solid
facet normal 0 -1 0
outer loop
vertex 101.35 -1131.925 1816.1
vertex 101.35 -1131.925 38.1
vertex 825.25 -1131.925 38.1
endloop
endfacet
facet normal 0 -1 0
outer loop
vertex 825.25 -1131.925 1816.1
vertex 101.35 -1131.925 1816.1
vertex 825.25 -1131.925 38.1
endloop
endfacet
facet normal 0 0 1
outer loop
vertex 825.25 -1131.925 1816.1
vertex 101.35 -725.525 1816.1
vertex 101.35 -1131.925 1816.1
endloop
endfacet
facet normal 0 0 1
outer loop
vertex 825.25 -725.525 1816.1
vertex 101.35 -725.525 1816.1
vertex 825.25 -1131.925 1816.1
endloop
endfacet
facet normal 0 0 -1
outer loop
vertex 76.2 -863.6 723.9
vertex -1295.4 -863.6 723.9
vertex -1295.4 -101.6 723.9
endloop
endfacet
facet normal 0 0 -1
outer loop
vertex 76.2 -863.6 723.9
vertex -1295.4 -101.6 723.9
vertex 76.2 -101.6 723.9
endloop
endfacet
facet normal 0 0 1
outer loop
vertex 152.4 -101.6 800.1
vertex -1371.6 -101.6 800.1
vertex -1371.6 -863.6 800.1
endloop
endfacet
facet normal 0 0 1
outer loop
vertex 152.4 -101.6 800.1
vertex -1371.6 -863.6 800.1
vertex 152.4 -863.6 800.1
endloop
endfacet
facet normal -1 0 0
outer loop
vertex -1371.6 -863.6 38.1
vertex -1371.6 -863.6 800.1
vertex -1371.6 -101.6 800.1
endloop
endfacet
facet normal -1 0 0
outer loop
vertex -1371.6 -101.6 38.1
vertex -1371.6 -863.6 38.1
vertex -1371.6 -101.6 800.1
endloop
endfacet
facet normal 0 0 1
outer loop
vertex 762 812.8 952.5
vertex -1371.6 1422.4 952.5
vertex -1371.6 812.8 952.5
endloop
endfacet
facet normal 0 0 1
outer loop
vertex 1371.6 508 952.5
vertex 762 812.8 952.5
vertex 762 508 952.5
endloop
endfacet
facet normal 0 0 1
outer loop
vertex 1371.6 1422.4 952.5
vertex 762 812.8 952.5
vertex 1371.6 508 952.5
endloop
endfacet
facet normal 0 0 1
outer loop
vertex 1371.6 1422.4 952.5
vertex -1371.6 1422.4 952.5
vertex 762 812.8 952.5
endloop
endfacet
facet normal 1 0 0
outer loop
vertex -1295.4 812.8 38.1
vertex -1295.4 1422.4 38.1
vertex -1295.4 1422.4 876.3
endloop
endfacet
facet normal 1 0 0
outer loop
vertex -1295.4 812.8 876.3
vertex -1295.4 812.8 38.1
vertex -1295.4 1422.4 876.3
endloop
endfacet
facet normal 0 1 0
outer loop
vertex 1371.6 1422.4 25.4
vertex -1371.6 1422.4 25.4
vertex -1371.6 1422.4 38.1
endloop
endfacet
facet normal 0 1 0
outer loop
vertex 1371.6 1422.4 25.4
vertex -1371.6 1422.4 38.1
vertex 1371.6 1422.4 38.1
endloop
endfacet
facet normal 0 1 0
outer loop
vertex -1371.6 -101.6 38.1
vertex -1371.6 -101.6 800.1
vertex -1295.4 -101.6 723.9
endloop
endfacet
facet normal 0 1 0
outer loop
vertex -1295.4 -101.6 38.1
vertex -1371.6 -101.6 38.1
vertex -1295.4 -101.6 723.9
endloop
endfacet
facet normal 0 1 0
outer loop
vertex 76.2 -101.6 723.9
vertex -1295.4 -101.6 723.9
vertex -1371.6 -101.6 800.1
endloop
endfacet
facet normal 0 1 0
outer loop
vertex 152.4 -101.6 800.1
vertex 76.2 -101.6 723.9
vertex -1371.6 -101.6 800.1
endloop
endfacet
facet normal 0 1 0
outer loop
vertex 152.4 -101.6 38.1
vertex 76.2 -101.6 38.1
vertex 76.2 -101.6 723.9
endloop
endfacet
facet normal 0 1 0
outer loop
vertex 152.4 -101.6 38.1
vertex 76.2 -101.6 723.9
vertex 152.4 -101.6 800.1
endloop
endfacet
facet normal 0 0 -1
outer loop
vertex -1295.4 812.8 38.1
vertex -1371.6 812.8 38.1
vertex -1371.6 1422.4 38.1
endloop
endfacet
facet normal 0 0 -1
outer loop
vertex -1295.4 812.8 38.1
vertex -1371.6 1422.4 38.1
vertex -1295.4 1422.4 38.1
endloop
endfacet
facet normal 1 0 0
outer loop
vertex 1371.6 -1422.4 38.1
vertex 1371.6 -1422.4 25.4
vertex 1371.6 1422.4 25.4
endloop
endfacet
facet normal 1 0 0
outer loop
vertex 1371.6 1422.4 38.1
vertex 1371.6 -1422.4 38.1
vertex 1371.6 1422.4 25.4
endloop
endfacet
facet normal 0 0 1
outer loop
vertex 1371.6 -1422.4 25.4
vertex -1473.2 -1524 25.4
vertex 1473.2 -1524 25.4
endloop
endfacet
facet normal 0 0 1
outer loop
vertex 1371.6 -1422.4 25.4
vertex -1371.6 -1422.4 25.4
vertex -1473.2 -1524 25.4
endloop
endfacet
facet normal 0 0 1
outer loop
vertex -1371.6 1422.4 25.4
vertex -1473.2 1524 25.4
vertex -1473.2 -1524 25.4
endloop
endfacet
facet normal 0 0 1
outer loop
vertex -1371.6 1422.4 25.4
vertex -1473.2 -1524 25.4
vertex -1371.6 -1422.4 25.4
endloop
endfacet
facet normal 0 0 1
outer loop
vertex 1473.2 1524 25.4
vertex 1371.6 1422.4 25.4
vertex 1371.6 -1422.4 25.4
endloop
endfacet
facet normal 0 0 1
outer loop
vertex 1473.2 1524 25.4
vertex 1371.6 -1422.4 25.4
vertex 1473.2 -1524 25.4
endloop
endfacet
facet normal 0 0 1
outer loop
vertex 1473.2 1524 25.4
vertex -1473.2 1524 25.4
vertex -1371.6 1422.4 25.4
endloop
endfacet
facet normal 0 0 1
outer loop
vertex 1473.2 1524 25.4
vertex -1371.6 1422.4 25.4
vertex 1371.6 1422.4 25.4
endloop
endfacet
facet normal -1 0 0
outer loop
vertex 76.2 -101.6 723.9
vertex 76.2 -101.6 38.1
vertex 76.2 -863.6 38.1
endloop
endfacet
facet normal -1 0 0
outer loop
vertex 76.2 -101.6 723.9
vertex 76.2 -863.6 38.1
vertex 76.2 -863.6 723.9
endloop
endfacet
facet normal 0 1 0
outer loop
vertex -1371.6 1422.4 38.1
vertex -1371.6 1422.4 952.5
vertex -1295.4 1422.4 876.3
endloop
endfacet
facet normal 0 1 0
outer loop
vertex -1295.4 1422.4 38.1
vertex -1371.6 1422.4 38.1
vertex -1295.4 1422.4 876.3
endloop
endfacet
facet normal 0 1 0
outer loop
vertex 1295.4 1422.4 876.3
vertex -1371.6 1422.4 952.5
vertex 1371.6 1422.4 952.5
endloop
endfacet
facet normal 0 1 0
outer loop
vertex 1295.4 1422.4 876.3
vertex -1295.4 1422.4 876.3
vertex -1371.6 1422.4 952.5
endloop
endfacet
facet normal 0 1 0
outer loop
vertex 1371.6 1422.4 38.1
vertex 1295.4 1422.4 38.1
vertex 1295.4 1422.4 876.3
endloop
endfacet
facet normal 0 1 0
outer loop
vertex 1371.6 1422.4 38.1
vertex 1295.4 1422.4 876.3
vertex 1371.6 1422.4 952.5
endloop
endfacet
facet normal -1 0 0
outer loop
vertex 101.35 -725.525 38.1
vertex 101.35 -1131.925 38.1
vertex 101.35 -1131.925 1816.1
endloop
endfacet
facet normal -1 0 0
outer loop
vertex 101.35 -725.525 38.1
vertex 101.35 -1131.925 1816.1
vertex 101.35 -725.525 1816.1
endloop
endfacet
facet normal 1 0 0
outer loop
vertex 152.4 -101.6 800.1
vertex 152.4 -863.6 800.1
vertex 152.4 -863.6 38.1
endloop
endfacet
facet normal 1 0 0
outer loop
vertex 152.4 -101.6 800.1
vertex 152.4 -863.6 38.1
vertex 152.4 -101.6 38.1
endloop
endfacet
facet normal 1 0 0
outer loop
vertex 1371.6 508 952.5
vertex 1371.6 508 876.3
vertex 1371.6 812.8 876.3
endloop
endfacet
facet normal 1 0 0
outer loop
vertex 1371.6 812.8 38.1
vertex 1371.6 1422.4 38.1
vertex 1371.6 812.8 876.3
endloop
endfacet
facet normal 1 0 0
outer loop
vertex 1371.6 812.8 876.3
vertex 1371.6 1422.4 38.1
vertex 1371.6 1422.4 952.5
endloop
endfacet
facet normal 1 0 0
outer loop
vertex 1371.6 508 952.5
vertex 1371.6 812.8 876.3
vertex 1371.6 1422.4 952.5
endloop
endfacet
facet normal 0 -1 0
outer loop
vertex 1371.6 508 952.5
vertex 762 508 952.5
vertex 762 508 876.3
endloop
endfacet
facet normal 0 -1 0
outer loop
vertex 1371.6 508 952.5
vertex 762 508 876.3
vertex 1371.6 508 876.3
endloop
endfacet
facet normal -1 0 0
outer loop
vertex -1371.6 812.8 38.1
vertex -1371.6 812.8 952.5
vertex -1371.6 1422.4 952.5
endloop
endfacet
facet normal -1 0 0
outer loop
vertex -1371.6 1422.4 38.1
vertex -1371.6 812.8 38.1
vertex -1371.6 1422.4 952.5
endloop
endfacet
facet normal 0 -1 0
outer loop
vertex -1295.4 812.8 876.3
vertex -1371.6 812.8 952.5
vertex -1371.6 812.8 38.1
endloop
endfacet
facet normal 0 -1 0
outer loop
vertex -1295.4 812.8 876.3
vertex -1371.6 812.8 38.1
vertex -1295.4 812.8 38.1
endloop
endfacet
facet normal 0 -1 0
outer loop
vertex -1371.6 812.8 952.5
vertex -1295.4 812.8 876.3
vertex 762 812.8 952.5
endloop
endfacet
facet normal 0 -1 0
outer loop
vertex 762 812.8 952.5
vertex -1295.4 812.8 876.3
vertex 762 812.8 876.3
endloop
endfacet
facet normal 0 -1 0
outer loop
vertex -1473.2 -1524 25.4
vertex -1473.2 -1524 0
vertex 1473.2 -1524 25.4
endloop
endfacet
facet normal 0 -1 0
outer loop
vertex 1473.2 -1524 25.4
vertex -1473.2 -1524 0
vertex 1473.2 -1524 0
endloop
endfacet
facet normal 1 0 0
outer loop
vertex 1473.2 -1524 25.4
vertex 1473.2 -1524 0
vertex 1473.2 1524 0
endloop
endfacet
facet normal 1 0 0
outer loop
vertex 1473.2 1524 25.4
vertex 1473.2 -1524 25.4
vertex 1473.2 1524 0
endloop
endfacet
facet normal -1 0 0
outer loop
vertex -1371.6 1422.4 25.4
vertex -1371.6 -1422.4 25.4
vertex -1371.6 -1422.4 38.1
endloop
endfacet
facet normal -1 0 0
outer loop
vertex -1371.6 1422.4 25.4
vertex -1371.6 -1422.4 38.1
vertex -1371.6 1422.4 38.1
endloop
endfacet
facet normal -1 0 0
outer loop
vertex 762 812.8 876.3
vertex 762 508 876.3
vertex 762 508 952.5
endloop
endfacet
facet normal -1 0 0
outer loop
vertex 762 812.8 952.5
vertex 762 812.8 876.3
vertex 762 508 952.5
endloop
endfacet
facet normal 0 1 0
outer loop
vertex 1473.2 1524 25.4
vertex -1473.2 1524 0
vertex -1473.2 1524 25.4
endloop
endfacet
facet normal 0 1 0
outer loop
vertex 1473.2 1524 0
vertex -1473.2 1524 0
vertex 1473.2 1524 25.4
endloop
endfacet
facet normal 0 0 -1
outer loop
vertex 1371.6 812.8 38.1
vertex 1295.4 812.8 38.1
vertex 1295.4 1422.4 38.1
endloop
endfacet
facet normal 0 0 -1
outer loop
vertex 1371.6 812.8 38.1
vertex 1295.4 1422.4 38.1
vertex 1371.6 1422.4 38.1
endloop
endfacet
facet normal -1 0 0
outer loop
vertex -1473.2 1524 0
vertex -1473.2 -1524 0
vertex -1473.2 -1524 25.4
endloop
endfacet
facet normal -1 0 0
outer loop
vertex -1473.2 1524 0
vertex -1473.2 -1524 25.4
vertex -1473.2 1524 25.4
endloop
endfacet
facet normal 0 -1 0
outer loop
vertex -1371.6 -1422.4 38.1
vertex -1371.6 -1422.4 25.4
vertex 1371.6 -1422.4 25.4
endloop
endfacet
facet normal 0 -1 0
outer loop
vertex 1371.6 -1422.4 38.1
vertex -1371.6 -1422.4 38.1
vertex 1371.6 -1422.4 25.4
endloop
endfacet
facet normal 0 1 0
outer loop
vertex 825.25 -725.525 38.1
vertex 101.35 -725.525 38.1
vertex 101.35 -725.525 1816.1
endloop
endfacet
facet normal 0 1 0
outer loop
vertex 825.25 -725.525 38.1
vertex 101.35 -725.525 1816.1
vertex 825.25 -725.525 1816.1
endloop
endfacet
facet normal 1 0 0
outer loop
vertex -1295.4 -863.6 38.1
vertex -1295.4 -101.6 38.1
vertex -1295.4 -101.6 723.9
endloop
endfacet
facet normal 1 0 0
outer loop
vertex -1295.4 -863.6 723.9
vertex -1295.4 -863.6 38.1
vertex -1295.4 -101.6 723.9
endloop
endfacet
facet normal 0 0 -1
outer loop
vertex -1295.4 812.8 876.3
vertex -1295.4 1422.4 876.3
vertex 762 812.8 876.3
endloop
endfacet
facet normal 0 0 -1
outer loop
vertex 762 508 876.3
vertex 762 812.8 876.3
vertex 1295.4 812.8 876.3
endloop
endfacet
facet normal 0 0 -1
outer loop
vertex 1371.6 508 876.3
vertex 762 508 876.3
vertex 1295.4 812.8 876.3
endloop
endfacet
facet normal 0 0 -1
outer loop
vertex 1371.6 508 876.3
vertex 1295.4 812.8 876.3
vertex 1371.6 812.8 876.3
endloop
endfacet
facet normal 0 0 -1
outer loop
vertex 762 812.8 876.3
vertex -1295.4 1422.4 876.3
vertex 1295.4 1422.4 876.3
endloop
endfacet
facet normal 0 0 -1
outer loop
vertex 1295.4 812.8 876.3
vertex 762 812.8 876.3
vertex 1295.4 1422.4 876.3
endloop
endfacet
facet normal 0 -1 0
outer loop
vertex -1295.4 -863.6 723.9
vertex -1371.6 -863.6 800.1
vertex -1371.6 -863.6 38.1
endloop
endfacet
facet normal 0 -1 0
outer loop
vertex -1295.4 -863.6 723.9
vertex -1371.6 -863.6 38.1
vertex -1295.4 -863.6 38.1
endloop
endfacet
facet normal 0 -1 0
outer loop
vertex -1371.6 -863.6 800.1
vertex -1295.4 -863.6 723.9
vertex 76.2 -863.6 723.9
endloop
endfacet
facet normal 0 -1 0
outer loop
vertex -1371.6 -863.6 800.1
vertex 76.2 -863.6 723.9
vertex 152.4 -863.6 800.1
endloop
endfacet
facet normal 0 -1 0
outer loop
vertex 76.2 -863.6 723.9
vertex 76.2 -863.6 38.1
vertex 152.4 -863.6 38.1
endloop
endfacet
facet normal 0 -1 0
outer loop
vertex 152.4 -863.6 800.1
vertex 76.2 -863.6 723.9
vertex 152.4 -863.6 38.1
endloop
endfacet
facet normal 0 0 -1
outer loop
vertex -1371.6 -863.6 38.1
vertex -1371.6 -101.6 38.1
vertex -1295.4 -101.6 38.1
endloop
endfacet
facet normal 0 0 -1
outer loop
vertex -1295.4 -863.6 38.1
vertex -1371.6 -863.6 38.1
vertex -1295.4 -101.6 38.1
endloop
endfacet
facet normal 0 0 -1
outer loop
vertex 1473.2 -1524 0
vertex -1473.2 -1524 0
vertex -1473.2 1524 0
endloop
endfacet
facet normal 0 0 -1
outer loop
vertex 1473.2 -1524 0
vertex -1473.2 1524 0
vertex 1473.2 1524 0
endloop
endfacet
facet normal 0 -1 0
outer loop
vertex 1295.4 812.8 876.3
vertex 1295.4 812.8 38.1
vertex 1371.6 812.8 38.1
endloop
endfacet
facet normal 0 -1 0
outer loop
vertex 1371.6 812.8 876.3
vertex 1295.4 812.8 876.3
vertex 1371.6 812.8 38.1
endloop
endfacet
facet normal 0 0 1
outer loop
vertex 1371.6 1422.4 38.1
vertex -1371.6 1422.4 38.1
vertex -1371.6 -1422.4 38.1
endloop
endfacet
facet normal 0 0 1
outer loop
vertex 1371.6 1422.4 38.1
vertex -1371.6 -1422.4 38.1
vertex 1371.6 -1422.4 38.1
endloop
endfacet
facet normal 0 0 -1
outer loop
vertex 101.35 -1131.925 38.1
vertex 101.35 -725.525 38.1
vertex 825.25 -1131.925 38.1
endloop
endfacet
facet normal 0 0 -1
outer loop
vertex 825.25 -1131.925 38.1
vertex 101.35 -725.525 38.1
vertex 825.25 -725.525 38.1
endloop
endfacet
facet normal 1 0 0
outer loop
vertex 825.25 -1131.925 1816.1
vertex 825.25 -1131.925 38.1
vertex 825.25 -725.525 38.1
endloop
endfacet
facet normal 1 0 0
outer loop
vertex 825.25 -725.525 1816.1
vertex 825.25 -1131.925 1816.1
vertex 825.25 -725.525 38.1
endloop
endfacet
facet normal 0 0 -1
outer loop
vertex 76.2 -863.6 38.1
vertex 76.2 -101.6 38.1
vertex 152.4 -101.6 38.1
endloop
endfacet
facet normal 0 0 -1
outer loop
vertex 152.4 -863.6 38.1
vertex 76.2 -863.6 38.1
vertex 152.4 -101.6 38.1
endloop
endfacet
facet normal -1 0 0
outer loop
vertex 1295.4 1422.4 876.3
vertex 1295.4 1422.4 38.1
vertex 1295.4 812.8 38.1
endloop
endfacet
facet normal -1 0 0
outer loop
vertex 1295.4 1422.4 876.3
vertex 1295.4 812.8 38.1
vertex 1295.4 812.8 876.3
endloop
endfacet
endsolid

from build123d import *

# Parameters (mm, degrees)
F0_W      = 2946.4
F0_H      = 3048
F1_DEPTH  = 25.4
F2_W      = 2743.2
F2_H      = 2844.8
F3_DEPTH  = 12.7
F4_W      = 1524
F4_H      = 762
F5_DEPTH  = 762
F6_W      = 1371.6
F6_H      = 685.8
F7_DEPTH  = 762
F8_W      = 2743.2
F8_H      = 609.6
F9_DEPTH  = 914.4
F10_W     = 2590.8
F10_H     = 838.2
F11_DEPTH = 609.6
F12_W     = 723.9
F12_H     = 406.4
F13_DEPTH = 1778
F14_W     = 609.6
F14_H     = 76.2
F15_DEPTH = 304.8


with BuildPart() as f1:
    # F0 (on Top) → F1 (new body)
    with BuildSketch(Plane.XY):
        Rectangle(F0_W, F0_H)
    extrude(amount=F1_DEPTH)

    # F2 (on face) → F3 (join)
    with BuildSketch(Plane.XY.offset(25.4)):
        Rectangle(F2_W, F2_H)
    extrude(amount=F3_DEPTH)


with BuildPart() as f5:
    # F4 (on face) → F5 (new body)
    with BuildSketch(Plane.XY.offset(38.1)):
        with Locations((-609.6, -482.6)):
            Rectangle(F4_W, F4_H)
    extrude(amount=F5_DEPTH)

    # F6 (on face) → F7 (cut, through all)
    with BuildSketch(Plane.XZ.offset(863.6)):
        with Locations((-609.6, 381)):
            Rectangle(F6_W, F6_H)
    extrude(amount=-F7_DEPTH, mode=Mode.SUBTRACT)


with BuildPart() as f9:
    # F8 (on face) → F9 (new body)
    with BuildSketch(Plane.XY.offset(38.1)):
        with Locations((0, 1117.6)):
            Rectangle(F8_W, F8_H)
    extrude(amount=F9_DEPTH)

    # F10 (on face) → F11 (cut, through all)
    with BuildSketch(Plane(origin=(0, 1422.4, 0), x_dir=(-1, 0, 0), z_dir=(0, 1, 0))):
        with Locations((0, 457.2)):
            Rectangle(F10_W, F10_H)
    extrude(amount=-F11_DEPTH, mode=Mode.SUBTRACT)

    # F14 (on face) → F15 (join)
    with BuildSketch(Plane.XZ.offset(-812.8)):
        with Locations((1066.8, 914.4)):
            Rectangle(F14_W, F14_H)
    extrude(amount=F15_DEPTH)


with BuildPart() as f13:
    # F12 (on face) → F13 (new body)
    with BuildSketch(Plane.XY.offset(38.1)):
        with Locations((463.300496, -928.725409)):
            Rectangle(F12_W, F12_H)
    extrude(amount=F13_DEPTH)


solid = Compound([f1.part, f5.part, f9.part, f13.part])
